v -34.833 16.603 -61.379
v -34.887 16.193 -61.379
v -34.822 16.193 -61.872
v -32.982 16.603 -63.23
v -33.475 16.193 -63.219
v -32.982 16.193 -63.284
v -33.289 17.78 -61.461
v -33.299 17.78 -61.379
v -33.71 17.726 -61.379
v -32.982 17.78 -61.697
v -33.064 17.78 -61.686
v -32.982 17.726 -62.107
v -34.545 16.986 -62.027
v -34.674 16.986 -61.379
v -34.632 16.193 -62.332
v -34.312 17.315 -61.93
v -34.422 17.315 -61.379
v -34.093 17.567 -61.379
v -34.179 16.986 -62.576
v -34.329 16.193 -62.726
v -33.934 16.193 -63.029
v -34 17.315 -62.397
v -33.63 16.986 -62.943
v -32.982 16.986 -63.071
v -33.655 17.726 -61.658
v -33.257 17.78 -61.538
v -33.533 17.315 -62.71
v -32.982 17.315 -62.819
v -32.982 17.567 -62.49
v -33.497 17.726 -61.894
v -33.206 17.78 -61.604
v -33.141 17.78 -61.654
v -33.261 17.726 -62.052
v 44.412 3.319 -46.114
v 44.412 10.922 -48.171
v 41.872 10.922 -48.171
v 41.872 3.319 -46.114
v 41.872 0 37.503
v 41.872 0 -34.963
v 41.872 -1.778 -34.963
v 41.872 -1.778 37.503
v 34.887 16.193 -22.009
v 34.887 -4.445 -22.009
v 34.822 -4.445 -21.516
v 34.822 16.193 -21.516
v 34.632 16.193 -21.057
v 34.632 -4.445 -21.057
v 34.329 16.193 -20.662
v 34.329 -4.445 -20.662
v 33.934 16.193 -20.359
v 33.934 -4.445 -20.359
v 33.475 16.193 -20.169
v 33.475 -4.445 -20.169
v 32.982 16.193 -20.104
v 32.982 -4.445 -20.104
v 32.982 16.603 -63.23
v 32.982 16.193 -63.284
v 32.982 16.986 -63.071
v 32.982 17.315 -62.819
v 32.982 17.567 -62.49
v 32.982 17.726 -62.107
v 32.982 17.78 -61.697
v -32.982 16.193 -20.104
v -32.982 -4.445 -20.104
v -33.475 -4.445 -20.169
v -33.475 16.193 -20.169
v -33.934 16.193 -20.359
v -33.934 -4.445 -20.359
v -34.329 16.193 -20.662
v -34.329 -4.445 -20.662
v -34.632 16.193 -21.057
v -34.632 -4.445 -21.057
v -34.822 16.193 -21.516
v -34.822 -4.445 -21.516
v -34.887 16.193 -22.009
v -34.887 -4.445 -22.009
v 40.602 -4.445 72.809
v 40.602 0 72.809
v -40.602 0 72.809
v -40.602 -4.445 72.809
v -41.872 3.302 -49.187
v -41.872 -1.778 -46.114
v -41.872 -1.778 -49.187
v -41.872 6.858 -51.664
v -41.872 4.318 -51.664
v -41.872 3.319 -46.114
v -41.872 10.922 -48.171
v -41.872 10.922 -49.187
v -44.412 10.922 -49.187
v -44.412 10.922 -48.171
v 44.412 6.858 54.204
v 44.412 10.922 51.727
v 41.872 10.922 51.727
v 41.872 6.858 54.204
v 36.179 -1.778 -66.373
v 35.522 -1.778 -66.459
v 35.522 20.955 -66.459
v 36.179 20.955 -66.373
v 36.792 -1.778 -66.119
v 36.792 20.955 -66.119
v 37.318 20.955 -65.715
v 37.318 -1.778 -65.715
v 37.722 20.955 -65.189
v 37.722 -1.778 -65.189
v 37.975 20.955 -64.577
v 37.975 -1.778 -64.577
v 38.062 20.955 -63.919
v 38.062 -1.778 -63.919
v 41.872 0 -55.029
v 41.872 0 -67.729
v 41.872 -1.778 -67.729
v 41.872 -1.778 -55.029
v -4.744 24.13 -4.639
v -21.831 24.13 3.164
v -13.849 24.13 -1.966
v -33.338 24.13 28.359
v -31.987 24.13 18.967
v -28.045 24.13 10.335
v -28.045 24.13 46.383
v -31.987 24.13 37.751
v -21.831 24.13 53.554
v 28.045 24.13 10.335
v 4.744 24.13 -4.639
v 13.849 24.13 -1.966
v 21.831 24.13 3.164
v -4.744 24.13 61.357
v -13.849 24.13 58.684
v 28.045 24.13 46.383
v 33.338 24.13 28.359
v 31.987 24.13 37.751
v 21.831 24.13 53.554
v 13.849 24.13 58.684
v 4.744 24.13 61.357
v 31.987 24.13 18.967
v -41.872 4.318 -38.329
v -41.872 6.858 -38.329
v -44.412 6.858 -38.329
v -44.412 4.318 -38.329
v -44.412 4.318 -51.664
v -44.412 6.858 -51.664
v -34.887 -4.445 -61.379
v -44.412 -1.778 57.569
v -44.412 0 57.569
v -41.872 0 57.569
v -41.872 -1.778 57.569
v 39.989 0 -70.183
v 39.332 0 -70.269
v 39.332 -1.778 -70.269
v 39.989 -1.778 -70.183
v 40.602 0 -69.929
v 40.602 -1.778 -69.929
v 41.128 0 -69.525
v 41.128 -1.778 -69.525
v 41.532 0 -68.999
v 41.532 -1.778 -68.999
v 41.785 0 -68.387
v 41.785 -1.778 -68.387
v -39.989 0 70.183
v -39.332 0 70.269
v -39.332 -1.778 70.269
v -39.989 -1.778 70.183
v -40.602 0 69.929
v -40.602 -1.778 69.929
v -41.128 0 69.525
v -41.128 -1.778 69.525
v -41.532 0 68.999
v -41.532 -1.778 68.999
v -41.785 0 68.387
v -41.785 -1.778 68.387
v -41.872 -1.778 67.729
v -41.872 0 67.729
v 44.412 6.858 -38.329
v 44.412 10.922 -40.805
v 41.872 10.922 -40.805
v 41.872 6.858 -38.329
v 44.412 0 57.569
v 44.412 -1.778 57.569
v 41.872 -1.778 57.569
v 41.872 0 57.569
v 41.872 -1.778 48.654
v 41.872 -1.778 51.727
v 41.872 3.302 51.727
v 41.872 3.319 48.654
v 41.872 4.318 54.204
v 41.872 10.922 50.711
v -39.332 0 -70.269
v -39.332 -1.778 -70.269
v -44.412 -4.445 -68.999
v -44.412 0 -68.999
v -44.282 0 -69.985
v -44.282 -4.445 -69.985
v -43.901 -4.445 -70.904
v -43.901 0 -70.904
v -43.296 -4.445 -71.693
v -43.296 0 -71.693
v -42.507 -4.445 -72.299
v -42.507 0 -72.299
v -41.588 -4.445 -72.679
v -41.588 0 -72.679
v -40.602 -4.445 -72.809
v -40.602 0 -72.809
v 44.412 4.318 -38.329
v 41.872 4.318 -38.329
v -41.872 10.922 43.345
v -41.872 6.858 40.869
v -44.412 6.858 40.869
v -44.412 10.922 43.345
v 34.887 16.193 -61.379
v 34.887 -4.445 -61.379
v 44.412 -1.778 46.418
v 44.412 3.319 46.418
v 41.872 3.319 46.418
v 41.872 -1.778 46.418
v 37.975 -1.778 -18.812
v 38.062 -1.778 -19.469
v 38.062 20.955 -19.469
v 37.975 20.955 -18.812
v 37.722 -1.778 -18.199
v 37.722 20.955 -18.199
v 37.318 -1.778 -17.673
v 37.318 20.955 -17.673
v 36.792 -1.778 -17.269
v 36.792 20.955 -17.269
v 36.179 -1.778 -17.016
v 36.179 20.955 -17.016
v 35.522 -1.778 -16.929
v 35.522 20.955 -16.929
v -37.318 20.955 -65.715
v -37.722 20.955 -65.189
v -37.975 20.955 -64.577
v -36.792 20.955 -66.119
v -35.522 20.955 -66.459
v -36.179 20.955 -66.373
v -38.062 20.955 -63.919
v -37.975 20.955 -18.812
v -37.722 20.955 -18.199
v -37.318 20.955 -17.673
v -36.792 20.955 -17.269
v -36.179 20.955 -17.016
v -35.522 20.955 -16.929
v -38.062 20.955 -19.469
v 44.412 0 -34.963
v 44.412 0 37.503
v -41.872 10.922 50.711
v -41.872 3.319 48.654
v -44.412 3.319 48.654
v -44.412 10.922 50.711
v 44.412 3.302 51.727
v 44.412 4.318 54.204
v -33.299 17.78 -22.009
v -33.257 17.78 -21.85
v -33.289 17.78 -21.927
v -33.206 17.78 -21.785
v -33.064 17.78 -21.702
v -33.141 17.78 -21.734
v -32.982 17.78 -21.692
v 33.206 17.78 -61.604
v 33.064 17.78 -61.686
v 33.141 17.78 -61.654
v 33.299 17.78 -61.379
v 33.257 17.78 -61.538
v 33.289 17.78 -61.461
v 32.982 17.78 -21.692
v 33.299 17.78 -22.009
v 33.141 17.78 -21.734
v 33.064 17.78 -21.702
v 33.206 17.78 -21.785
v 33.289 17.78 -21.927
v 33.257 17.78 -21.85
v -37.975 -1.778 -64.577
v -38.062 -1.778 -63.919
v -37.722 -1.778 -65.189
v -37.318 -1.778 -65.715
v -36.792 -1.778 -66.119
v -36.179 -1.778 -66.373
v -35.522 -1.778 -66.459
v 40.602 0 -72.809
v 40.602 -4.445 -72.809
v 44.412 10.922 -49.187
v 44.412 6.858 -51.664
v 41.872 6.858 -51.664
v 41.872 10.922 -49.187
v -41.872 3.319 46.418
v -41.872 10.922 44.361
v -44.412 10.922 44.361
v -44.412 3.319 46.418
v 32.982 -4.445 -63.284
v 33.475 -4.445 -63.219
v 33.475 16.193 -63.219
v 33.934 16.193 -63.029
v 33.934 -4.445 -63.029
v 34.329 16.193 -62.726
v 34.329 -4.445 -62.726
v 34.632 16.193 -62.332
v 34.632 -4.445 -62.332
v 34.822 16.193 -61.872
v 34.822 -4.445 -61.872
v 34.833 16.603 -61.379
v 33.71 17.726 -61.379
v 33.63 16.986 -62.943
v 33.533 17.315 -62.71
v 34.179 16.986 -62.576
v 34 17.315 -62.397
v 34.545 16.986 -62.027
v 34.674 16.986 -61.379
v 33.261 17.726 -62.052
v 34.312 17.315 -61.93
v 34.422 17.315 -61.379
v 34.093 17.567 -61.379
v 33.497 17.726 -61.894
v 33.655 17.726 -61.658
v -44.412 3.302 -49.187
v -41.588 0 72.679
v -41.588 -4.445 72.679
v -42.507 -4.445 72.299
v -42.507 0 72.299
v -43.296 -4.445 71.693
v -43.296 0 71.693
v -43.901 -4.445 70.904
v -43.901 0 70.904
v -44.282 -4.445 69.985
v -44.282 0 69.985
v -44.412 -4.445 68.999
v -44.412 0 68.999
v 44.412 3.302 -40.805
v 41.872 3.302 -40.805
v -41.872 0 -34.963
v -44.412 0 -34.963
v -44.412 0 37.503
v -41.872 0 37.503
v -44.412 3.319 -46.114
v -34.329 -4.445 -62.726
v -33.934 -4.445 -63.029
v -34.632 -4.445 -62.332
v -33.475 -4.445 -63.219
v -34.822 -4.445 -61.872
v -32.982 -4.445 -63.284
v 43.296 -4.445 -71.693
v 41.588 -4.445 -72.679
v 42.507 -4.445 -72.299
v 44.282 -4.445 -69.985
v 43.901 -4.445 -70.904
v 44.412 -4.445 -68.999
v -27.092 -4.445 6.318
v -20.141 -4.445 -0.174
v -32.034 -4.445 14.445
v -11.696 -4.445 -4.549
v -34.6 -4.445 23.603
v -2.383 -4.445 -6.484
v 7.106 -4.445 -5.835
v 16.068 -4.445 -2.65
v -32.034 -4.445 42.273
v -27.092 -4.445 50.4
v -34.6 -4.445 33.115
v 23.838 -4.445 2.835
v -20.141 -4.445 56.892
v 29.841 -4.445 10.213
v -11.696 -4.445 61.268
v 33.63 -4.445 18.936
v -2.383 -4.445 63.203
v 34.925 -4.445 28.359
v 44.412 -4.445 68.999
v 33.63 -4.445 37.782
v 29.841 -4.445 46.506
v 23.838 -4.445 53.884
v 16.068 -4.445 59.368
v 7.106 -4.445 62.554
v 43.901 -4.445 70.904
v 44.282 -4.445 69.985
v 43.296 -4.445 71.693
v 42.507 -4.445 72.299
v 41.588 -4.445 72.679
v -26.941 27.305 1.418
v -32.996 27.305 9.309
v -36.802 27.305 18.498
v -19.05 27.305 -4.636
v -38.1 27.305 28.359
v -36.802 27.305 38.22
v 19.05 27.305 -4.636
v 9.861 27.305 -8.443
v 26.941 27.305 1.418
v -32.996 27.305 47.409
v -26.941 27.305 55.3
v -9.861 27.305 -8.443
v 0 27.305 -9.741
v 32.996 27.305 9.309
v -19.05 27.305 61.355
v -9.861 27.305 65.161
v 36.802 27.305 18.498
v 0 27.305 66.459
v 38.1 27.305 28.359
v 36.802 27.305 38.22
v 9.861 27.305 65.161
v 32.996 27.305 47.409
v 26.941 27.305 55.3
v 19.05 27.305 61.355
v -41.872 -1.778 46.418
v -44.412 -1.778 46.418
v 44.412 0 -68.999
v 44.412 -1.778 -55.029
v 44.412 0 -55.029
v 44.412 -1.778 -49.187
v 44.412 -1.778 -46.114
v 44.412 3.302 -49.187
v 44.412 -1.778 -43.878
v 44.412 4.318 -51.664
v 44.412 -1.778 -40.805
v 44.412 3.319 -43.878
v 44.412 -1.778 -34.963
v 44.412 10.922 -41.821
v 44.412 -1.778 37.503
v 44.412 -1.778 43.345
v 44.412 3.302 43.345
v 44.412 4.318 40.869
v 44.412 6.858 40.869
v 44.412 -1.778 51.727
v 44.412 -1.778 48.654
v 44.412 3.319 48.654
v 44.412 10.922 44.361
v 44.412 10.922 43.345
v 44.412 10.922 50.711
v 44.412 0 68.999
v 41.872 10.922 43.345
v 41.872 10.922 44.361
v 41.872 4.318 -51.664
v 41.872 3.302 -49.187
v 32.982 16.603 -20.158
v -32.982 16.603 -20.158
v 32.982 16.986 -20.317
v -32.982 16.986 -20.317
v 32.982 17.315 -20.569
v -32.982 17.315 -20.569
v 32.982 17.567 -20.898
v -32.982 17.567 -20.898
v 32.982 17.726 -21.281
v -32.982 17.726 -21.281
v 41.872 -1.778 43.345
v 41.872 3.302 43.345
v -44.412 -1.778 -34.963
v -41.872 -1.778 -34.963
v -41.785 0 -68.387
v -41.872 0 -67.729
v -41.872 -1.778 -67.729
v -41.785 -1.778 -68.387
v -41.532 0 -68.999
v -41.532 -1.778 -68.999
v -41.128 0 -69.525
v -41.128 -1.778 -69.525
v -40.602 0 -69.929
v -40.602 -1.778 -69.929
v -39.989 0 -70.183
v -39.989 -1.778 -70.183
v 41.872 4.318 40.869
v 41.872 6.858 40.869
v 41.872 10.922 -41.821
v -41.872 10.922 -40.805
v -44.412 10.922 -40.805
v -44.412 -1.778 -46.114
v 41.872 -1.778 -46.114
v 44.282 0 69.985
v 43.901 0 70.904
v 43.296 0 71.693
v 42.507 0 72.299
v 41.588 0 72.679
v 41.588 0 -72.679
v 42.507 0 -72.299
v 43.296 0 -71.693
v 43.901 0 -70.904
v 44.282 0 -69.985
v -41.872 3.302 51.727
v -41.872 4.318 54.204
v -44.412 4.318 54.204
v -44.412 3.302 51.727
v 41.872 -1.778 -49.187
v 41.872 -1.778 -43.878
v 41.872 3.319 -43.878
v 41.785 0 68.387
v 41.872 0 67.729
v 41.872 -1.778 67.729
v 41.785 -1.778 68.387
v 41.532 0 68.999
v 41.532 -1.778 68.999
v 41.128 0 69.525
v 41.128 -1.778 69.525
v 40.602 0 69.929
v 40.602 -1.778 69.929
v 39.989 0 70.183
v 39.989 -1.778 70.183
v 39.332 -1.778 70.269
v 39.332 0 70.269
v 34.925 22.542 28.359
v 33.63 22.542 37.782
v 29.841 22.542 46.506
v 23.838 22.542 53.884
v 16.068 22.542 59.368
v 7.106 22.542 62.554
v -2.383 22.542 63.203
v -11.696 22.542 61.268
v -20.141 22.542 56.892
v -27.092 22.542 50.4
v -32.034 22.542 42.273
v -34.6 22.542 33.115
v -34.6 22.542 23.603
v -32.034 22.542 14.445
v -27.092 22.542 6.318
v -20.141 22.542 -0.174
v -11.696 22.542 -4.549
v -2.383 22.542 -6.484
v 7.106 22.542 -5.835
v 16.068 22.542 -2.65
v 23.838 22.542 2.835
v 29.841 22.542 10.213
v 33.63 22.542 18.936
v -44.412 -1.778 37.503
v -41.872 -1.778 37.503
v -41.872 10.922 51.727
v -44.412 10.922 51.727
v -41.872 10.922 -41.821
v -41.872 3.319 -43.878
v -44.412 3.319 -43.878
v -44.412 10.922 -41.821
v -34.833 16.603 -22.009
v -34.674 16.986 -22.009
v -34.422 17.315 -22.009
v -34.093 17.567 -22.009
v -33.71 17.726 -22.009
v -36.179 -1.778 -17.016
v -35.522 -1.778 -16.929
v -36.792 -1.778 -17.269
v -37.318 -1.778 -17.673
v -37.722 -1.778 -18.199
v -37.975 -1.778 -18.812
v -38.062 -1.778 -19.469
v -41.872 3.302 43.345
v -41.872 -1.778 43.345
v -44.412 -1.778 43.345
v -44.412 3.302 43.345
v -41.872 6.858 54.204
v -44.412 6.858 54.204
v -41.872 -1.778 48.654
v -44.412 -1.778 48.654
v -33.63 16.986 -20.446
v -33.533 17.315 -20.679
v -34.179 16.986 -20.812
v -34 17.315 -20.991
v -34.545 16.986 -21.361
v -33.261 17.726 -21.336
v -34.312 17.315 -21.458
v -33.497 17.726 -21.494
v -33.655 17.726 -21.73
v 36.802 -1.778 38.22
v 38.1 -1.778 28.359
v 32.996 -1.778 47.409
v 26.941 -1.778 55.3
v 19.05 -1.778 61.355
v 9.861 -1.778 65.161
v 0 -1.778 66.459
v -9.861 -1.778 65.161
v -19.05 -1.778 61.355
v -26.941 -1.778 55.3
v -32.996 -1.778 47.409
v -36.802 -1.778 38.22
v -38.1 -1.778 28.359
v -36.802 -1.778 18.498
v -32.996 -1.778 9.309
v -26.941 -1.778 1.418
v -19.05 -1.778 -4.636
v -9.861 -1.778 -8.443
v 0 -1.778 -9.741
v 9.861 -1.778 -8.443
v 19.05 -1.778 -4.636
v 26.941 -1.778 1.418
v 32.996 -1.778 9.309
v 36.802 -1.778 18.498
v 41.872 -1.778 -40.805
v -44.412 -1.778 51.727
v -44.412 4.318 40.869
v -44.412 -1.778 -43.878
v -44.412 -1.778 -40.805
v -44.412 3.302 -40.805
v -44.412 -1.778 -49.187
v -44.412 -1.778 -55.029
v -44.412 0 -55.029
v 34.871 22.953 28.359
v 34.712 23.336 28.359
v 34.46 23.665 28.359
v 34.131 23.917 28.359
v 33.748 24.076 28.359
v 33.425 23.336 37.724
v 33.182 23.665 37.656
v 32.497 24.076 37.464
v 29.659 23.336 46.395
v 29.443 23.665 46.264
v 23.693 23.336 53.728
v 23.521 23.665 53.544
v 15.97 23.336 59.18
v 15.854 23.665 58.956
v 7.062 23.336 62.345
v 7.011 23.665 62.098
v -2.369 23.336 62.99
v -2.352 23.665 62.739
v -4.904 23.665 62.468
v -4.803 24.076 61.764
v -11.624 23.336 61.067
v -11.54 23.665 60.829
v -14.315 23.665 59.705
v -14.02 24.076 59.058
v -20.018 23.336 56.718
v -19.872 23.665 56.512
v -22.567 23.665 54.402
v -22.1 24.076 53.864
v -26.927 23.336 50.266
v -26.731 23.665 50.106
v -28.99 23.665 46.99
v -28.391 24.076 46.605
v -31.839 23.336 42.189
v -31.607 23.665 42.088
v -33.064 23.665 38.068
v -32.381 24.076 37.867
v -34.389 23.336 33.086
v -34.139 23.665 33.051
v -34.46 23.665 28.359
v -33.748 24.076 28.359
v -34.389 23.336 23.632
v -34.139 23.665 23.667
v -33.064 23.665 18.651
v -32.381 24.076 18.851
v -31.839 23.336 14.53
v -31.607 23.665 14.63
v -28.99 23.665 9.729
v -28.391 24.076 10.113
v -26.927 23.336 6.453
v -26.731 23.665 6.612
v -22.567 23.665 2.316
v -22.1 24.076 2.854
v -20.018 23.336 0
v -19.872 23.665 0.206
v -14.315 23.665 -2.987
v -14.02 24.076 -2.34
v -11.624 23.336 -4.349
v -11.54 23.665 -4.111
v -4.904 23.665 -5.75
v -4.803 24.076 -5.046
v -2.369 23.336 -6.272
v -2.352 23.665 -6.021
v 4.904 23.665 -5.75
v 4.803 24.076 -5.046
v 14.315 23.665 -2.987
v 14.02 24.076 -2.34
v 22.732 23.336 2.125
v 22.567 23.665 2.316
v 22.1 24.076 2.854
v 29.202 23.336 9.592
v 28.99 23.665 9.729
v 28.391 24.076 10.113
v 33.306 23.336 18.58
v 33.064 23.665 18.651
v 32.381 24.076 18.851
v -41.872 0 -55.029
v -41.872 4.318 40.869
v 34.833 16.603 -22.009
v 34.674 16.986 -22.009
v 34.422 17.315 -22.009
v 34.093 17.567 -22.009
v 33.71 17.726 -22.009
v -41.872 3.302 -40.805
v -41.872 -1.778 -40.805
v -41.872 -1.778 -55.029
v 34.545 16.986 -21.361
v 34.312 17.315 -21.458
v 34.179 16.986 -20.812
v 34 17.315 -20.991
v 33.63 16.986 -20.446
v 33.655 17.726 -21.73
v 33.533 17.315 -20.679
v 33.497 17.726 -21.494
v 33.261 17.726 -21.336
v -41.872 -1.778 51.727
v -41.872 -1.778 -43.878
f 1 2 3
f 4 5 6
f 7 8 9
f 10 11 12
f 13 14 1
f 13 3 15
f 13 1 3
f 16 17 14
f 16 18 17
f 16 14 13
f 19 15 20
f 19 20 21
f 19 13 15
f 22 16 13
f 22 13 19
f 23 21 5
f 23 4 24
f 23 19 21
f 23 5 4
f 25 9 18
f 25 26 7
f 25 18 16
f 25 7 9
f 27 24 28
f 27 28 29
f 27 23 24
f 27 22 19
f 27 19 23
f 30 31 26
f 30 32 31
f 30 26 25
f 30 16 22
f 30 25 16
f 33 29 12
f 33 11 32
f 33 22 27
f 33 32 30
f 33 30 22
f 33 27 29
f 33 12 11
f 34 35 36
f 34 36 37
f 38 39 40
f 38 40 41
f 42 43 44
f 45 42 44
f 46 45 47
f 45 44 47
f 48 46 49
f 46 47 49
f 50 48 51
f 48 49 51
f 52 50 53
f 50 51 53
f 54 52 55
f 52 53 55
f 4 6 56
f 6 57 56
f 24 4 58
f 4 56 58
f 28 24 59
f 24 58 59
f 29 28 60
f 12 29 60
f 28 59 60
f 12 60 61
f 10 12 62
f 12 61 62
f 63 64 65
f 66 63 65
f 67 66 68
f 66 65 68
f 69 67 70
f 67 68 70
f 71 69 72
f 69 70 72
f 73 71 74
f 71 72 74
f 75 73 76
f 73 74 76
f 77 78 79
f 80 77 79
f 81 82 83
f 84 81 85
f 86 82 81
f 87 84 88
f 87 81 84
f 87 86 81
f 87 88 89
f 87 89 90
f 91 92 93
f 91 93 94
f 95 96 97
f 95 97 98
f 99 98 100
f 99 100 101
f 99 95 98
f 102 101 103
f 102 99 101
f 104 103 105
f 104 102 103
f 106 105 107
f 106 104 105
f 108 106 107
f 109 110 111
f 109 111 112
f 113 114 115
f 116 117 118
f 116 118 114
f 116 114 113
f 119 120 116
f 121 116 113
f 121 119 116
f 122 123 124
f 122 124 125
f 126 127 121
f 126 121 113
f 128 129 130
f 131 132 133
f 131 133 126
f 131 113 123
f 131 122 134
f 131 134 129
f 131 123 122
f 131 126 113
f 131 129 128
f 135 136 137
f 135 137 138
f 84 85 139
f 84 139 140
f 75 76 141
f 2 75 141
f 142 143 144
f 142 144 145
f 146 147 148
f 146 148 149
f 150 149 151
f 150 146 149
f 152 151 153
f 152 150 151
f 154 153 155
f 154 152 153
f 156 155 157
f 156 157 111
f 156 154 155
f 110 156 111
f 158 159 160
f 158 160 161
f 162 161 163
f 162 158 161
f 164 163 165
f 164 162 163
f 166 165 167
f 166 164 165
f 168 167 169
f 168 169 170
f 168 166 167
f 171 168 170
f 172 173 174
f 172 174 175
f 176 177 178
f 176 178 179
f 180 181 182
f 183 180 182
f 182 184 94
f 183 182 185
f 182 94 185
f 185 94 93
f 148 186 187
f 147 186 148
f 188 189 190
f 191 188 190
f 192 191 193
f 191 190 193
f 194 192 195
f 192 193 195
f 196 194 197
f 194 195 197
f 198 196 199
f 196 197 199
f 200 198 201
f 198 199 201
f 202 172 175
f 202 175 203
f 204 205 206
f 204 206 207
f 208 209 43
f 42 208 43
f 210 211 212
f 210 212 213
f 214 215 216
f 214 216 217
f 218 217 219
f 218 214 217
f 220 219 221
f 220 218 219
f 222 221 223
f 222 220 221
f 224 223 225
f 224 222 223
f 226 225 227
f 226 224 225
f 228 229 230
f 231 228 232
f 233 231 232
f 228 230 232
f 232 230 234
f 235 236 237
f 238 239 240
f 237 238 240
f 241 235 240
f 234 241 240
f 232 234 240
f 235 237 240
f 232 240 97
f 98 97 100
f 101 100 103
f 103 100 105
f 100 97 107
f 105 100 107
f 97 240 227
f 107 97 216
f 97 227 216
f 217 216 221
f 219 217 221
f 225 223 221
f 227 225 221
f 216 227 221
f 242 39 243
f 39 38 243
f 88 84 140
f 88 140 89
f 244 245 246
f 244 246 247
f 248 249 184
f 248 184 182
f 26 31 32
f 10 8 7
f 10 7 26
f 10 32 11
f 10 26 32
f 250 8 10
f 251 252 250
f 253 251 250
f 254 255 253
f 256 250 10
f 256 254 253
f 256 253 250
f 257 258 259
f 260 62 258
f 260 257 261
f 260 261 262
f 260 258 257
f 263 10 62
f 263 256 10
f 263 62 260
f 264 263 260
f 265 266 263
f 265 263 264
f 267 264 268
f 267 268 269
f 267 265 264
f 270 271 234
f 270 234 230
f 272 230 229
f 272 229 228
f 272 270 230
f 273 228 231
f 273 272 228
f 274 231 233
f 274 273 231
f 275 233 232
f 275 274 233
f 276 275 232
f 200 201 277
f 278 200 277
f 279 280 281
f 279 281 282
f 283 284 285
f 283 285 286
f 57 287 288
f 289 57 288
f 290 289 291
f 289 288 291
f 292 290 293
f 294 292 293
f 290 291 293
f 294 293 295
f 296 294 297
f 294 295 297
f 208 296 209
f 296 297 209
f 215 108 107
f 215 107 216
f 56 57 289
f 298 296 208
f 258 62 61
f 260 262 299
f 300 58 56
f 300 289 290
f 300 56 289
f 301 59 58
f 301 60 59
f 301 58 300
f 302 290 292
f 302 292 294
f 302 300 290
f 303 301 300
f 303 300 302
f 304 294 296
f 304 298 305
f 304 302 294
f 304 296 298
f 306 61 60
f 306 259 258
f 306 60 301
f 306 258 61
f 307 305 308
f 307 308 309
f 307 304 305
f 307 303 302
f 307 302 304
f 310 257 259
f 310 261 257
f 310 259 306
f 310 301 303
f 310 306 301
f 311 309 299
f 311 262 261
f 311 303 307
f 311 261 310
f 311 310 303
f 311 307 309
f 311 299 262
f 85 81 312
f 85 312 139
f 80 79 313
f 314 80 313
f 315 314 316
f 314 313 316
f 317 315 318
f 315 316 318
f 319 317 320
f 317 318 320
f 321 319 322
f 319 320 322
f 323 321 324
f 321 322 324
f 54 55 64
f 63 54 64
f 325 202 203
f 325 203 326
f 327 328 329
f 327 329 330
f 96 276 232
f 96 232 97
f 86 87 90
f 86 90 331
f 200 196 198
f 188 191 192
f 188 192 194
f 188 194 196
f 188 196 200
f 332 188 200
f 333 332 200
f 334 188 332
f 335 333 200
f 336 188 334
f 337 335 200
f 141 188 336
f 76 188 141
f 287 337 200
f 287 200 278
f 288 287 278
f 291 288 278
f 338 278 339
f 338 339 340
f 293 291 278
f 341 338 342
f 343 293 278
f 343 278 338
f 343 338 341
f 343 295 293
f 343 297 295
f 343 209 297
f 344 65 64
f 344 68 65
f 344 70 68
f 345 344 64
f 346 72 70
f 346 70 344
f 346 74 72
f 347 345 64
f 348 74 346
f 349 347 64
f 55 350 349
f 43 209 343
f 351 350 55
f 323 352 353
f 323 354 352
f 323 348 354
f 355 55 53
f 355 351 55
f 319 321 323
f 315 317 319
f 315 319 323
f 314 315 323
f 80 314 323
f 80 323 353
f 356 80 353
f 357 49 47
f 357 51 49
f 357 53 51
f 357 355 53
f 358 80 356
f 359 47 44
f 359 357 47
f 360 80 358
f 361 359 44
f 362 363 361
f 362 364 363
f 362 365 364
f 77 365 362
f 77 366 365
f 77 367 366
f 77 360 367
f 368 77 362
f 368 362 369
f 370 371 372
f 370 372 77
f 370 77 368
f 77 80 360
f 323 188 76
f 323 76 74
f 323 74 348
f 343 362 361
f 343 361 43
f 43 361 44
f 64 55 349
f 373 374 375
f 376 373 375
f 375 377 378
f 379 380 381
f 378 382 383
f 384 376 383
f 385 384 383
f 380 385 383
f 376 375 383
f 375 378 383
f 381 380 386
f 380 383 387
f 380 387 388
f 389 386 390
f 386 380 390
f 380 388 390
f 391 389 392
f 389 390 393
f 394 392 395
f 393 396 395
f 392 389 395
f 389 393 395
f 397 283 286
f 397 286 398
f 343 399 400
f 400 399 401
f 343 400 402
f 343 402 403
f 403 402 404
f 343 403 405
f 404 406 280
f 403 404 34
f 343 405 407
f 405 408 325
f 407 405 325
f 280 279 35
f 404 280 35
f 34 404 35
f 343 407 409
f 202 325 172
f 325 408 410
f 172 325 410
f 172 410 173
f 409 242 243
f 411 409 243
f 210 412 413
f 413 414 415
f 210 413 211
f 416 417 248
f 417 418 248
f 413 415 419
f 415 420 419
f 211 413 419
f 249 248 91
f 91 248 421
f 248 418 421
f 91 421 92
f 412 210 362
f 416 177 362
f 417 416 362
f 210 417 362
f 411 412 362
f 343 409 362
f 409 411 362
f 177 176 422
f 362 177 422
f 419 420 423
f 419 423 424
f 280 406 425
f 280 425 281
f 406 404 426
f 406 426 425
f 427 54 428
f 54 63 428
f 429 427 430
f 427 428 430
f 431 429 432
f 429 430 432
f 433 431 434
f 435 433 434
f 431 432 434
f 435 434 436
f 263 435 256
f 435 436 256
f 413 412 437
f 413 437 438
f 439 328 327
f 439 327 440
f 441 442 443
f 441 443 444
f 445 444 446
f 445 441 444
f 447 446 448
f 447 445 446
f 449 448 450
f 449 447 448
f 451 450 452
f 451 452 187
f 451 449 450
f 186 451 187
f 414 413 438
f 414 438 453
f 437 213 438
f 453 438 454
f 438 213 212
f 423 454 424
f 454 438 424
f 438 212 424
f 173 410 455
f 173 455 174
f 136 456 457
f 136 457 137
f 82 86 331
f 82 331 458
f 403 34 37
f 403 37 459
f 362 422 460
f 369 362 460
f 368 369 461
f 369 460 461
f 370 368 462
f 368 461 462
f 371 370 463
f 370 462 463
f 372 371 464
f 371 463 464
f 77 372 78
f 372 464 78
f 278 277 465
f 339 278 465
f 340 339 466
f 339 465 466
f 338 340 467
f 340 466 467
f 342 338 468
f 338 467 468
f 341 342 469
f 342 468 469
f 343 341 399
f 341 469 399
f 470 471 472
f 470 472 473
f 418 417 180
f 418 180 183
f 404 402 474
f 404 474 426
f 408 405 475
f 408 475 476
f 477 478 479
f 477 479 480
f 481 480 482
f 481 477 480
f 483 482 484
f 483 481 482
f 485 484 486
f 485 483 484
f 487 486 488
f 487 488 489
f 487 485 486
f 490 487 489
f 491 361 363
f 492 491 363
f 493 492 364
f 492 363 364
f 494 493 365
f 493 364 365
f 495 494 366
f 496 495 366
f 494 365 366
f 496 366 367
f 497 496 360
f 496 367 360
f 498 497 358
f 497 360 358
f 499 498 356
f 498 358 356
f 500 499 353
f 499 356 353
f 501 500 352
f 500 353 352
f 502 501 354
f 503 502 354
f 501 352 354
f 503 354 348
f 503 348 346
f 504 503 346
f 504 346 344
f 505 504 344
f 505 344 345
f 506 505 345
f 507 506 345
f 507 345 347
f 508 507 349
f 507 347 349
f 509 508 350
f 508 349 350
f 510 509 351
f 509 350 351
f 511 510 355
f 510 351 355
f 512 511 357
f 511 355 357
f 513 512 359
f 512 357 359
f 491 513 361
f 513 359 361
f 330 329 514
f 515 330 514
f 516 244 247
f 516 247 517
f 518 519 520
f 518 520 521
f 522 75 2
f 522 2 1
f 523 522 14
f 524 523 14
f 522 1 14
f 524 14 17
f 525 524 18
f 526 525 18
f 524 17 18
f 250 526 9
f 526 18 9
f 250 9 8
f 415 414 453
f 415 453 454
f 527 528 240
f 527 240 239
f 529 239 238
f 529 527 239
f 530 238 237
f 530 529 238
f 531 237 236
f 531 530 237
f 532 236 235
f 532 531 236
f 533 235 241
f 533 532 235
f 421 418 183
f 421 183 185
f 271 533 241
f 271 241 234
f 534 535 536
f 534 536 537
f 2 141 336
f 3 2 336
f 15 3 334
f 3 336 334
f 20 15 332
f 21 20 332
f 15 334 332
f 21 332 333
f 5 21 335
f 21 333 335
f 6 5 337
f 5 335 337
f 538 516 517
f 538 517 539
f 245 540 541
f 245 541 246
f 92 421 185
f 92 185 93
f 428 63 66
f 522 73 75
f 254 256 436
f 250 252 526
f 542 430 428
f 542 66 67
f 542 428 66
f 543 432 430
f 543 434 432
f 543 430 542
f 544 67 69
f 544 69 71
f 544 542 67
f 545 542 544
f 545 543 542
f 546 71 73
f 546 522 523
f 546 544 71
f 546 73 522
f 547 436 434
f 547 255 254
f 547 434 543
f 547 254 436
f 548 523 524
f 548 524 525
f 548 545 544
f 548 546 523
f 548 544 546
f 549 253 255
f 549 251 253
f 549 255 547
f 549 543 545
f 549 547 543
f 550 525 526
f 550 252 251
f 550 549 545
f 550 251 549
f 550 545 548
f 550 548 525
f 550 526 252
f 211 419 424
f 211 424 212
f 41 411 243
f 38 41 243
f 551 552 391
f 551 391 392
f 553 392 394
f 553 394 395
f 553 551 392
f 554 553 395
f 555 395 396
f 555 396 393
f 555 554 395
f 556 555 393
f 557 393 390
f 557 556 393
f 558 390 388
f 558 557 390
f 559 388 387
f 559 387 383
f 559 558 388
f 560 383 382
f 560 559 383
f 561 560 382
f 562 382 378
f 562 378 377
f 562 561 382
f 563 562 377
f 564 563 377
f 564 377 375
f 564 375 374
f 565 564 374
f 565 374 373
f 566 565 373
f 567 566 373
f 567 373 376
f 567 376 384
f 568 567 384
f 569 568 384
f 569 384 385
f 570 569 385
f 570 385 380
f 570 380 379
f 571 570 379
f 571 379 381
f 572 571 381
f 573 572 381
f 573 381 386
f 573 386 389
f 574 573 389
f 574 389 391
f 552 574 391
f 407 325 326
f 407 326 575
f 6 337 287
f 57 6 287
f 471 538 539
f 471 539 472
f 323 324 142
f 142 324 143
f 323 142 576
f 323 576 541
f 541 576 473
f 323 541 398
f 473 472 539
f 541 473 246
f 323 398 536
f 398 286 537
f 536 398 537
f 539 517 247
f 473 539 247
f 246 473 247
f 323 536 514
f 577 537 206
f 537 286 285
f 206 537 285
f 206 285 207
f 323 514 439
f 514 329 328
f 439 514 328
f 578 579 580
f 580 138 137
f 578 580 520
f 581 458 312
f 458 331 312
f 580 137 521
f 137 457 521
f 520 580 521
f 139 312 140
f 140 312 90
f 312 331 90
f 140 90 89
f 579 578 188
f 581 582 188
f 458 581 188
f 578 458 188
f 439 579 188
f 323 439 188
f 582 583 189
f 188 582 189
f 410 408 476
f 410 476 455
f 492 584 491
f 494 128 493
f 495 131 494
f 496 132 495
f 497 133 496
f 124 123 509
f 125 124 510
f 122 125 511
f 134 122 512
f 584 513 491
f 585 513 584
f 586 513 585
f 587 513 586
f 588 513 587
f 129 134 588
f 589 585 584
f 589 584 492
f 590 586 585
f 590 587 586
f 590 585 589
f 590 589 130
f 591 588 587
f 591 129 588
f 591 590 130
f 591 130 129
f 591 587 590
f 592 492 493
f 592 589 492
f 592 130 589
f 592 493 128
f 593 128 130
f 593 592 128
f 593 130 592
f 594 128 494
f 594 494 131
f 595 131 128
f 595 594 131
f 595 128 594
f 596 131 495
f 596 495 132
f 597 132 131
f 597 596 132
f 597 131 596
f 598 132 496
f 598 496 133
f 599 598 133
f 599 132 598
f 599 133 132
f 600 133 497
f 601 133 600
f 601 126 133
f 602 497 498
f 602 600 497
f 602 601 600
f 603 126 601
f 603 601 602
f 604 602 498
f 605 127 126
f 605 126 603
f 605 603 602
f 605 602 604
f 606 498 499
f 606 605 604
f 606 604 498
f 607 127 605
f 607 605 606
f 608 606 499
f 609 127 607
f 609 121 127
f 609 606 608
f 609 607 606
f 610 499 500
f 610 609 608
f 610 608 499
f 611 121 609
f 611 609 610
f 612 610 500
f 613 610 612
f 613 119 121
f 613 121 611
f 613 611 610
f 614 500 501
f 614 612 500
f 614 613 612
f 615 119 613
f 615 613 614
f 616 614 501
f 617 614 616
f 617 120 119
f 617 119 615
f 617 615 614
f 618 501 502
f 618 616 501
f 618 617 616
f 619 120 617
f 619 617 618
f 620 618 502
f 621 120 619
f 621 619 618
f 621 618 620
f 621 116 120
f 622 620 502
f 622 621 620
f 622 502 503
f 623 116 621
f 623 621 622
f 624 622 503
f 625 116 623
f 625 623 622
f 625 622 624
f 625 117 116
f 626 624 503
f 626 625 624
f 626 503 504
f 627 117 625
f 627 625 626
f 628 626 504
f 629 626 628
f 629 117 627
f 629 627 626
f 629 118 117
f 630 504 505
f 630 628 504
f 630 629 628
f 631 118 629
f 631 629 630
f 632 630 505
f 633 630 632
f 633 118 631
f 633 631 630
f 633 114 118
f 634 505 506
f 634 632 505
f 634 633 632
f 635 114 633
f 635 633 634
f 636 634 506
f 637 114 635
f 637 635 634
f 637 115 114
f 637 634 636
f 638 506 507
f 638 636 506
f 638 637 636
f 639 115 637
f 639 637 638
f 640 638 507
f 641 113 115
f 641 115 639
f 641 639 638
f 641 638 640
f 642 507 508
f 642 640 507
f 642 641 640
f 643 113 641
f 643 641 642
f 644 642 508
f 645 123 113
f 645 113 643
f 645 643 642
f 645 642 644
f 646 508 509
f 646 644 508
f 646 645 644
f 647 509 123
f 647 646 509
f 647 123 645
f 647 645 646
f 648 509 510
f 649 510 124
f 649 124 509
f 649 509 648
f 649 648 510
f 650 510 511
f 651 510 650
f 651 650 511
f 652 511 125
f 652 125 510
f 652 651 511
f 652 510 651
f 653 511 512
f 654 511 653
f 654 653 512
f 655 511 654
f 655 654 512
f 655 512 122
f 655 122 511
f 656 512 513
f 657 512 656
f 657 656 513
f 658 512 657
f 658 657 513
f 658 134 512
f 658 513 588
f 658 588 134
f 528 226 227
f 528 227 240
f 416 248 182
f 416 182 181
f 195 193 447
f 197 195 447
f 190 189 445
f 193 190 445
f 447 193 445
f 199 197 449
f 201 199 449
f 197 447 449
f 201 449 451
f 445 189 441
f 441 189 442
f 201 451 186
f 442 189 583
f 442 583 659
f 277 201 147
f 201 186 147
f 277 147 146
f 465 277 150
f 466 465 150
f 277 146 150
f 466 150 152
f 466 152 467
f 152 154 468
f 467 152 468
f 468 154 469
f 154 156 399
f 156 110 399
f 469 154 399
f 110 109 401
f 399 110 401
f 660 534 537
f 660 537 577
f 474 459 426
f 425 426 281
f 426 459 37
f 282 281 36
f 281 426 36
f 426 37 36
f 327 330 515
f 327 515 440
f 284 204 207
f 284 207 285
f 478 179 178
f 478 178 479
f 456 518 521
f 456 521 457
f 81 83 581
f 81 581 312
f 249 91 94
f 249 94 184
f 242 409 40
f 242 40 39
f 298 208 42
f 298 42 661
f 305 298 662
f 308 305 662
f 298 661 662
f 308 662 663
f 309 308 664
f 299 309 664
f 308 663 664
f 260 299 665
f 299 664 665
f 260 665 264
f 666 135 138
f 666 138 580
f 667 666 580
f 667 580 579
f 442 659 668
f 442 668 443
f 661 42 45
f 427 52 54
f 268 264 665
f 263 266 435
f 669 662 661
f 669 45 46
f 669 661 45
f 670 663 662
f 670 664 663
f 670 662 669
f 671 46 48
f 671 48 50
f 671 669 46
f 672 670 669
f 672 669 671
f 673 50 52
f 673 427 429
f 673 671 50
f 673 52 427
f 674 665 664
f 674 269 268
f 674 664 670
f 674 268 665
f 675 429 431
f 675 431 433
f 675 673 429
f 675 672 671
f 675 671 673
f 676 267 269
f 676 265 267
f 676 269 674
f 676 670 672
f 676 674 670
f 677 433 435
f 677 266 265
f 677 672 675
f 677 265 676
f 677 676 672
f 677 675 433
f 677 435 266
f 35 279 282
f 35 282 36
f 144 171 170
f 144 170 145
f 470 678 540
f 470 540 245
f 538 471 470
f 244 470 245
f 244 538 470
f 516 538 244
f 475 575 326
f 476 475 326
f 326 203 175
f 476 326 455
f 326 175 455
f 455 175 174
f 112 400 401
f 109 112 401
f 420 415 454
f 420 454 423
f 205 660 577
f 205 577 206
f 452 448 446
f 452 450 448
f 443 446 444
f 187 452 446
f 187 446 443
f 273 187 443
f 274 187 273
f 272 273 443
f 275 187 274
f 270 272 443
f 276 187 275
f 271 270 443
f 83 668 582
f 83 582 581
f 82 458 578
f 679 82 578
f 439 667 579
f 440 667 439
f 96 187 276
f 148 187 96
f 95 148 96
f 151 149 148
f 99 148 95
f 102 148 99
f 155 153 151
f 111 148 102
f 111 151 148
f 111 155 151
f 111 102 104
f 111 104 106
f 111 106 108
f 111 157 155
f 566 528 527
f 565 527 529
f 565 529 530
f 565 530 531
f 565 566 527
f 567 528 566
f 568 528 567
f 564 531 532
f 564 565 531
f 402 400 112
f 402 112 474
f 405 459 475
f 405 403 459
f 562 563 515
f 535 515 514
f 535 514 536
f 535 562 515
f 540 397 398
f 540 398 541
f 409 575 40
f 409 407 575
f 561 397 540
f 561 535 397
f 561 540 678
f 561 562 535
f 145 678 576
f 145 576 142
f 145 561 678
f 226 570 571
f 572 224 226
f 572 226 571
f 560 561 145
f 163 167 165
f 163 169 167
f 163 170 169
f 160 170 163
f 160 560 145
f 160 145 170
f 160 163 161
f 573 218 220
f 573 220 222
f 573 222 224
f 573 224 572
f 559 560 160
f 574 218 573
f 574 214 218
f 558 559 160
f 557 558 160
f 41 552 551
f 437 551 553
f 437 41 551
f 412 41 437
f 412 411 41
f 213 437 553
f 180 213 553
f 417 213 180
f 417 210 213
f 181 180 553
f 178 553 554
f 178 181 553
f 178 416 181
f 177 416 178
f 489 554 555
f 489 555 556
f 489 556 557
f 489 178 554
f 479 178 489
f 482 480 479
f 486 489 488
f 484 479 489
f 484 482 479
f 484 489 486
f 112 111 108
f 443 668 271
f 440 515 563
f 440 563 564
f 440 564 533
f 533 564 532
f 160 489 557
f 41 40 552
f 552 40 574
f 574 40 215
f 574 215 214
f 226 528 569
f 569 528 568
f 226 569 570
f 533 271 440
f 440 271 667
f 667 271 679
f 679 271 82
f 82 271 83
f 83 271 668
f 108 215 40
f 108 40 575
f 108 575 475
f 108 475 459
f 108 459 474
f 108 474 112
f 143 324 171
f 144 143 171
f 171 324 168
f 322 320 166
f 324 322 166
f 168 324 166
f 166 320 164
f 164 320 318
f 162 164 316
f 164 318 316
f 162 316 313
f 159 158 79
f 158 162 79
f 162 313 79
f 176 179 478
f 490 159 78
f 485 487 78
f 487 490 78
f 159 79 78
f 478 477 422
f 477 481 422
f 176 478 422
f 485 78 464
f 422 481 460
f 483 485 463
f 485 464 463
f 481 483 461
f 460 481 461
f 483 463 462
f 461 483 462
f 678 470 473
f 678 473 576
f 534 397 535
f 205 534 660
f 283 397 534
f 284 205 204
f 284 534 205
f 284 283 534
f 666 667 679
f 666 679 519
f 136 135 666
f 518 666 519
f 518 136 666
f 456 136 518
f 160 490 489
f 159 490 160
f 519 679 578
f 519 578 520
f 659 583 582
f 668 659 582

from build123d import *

# Parameters (mm, degrees)
F1_DEPTH  = 4.445
F3_DEPTH  = 1.778
F5_R      = 38.1
F6_DEPTH  = 31.75
F4_R      = 34.925
F7_DEPTH  = 28.575
F10_DEPTH = 25.4
F11_DEPTH = 22.225
F12_R     = 1.5875
F13_W     = 1.778
F13_H     = 20.066
F14_DEPTH = 2.54
F15_W     = 1.778
F15_H     = 20.066
F16_DEPTH = 2.54
F17_W     = 1.778
F17_H     = 20.066
F18_DEPTH = 2.54
F19_W     = 1.778
F19_H     = 20.066
F20_DEPTH = 2.54
F22_DEPTH = 2.54
F23_START = -86.2838
F23_DEPTH = 2.54


with BuildPart() as f1:
    # F0 (on Front) → F1 (new body)
    with BuildSketch(Plane.XZ):
        with BuildLine():
            Line((40.6019, 72.8091), (-40.6019, 72.8091))
            ThreePointArc((-40.6019, 72.8091), (-43.2959768363, 71.6931768363), (-44.4119, 68.9991))
            Line((-44.4119, 68.9991), (-44.4119, -68.9991))
            ThreePointArc((-44.4119, -68.9991), (-43.2959768363, -71.6931768363), (-40.6019, -72.8091))
            Line((-40.6019, -72.8091), (40.6019, -72.8091))
            ThreePointArc((40.6019, -72.8091), (43.2959768363, -71.6931768363), (44.4119, -68.9991))
            Line((44.4119, -68.9991), (44.4119, 68.9991))
            ThreePointArc((44.4119, 68.9991), (43.2959768363, 71.6931768363), (40.6019, 72.8091))
        make_face()
    extrude(amount=F1_DEPTH)

    # F2 (on face) → F3 (cut)
    with BuildSketch(Plane.XZ):
        with BuildLine():
            Line((41.8719, -67.7291), (41.8719, 67.7291))
            ThreePointArc((41.8719, 67.7291), (41.1279512242, 69.5251512242), (39.3319, 70.2691))
            Line((39.3319, 70.2691), (-39.3319, 70.2691))
            ThreePointArc((-39.3319, 70.2691), (-41.1279512242, 69.5251512242), (-41.8719, 67.7291))
            Line((-41.8719, 67.7291), (-41.8719, -67.7291))
            ThreePointArc((-41.8719, -67.7291), (-41.1279512242, -69.5251512242), (-39.3319, -70.2691))
            Line((-39.3319, -70.2691), (39.3319, -70.2691))
            ThreePointArc((39.3319, -70.2691), (41.1279512242, -69.5251512242), (41.8719, -67.7291))
        make_face()
    extrude(amount=F3_DEPTH, mode=Mode.SUBTRACT)

    # F5 (on face) → F6 (join)
    with BuildSketch(Plane.XZ.offset(4.445)):
        with Locations((0, 28.3591)):
            Circle(F5_R)
    extrude(amount=-F6_DEPTH)

    # F4 (on face) → F7 (cut)
    with BuildSketch(Plane.XZ.offset(4.445)):
        with Locations((0, 28.3591)):
            Circle(F4_R)
    extrude(amount=-F7_DEPTH, mode=Mode.SUBTRACT)

    # F8 (on face) → F10 (join)
    with BuildSketch(Plane.XZ.offset(4.445)):
        with BuildLine():
            Line((35.5219, -16.9291), (-35.5219, -16.9291))
            ThreePointArc((-35.5219, -16.9291), (-37.3179512242, -17.6730487758), (-38.0619, -19.4691))
            Line((-38.0619, -19.4691), (-38.0619, -63.9191))
            ThreePointArc((-38.0619, -63.9191), (-37.3179512242, -65.7151512242), (-35.5219, -66.4591))
            Line((-35.5219, -66.4591), (35.5219, -66.4591))
            ThreePointArc((35.5219, -66.4591), (37.3179512242, -65.7151512242), (38.0619, -63.9191))
            Line((38.0619, -63.9191), (38.0619, -19.4691))
            ThreePointArc((38.0619, -19.4691), (37.3179512242, -17.6730487758), (35.5219, -16.9291))
        make_face()
    extrude(amount=-F10_DEPTH)

    # F9 (on face) → F11 (cut)
    with BuildSketch(Plane.XZ.offset(4.445)):
        with BuildLine():
            Line((32.9819, -20.1041), (-32.9819, -20.1041))
            ThreePointArc((-32.9819, -20.1041), (-34.3289384182, -20.6620615818), (-34.8869, -22.0091))
            Line((-34.8869, -22.0091), (-34.8869, -61.3791))
            ThreePointArc((-34.8869, -61.3791), (-34.3289384182, -62.7261384182), (-32.9819, -63.2841))
            Line((-32.9819, -63.2841), (32.9819, -63.2841))
            ThreePointArc((32.9819, -63.2841), (34.3289384182, -62.7261384182), (34.8869, -61.3791))
            Line((34.8869, -61.3791), (34.8869, -22.0091))
            ThreePointArc((34.8869, -22.0091), (34.3289384182, -20.6620615818), (32.9819, -20.1041))
        make_face()
    extrude(amount=-F11_DEPTH, mode=Mode.SUBTRACT)

    # F12
    f12_edges = [f1.edges().sort_by_distance(p)[0] for p in [
        (34.8869, 17.78, -41.6941),
        (34.328938, 17.78, -20.662062),
        (0, 17.78, -20.1041),
        (-34.328938, 17.78, -20.662062),
        (-34.8869, 17.78, -41.6941),
        (-34.328938, 17.78, -62.726138),
        (0, 17.78, -63.2841),
        (34.328938, 17.78, -62.726138),
        (-34.925, 24.13, 28.3591),
    ]]
    fillet(f12_edges, radius=F12_R)

    # F13 (on face) → F14 (cut)
    with BuildSketch(Plane.YZ.offset(44.4119)):
        with Locations((-0.889, -44.9961)):
            Rectangle(F13_W, F13_H)
    extrude(amount=-F14_DEPTH, mode=Mode.SUBTRACT)

    # F15 (on face) → F16 (cut)
    with BuildSketch(Plane(origin=(-44.4119, 0, 0), x_dir=(0, -1, 0), z_dir=(-1, 0, 0))):
        with Locations((0.889, -44.9961)):
            Rectangle(F15_W, F15_H)
    extrude(amount=-F16_DEPTH, mode=Mode.SUBTRACT)

    # F17 (on face) → F18 (cut)
    with BuildSketch(Plane.YZ.offset(44.4119)):
        with Locations((-0.889, 47.5361)):
            Rectangle(F17_W, F17_H)
    extrude(amount=-F18_DEPTH, mode=Mode.SUBTRACT)

    # F19 (on face) → F20 (cut)
    with BuildSketch(Plane(origin=(-44.4119, 0, 0), x_dir=(0, -1, 0), z_dir=(-1, 0, 0))):
        with Locations((0.889, 47.5361)):
            Rectangle(F19_W, F19_H)
    extrude(amount=-F20_DEPTH, mode=Mode.SUBTRACT)

    # F21 (on face) → F22 (join)
    with BuildSketch(Plane.YZ.offset(44.4119)):
        Polygon((-1.778, -46.1137), (-1.778, -49.1871), (3.302, -49.1871), (4.318, -51.6636), (6.858, -51.6636), (10.922, -49.1871), (10.922, -48.1711), (3.3188345842, -46.1137), align=None)
        Polygon((-1.778, -40.8051), (-1.778, -43.8785), (3.3188345842, -43.8785), (10.922, -41.8211), (10.922, -40.8051), (6.858, -38.3286), (4.318, -38.3286), (3.302, -40.8051), align=None)
        Polygon((-1.778, 46.4185), (-1.778, 43.3451), (3.302, 43.3451), (4.318, 40.8686), (6.858, 40.8686), (10.922, 43.3451), (10.922, 44.3611), (3.3188345842, 46.4185), align=None)
        Polygon((3.302, 51.7271), (-1.778, 51.7271), (-1.778, 48.6537), (3.3188345842, 48.6537), (10.922, 50.7111), (10.922, 51.7271), (6.858, 54.2036), (4.318, 54.2036), align=None)
    extrude(amount=-F22_DEPTH)

    # F21 (on face) → F23 (join)
    with BuildSketch(Plane.YZ.offset(44.4119).offset(F23_START)):
        Polygon((-1.778, -46.1137), (-1.778, -49.1871), (3.302, -49.1871), (4.318, -51.6636), (6.858, -51.6636), (10.922, -49.1871), (10.922, -48.1711), (3.3188345842, -46.1137), align=None)
        Polygon((-1.778, -40.8051), (-1.778, -43.8785), (3.3188345842, -43.8785), (10.922, -41.8211), (10.922, -40.8051), (6.858, -38.3286), (4.318, -38.3286), (3.302, -40.8051), align=None)
        Polygon((-1.778, 46.4185), (-1.778, 43.3451), (3.302, 43.3451), (4.318, 40.8686), (6.858, 40.8686), (10.922, 43.3451), (10.922, 44.3611), (3.3188345842, 46.4185), align=None)
        Polygon((3.302, 51.7271), (-1.778, 51.7271), (-1.778, 48.6537), (3.3188345842, 48.6537), (10.922, 50.7111), (10.922, 51.7271), (6.858, 54.2036), (4.318, 54.2036), align=None)
    extrude(amount=-F23_DEPTH)


solid = f1.part
